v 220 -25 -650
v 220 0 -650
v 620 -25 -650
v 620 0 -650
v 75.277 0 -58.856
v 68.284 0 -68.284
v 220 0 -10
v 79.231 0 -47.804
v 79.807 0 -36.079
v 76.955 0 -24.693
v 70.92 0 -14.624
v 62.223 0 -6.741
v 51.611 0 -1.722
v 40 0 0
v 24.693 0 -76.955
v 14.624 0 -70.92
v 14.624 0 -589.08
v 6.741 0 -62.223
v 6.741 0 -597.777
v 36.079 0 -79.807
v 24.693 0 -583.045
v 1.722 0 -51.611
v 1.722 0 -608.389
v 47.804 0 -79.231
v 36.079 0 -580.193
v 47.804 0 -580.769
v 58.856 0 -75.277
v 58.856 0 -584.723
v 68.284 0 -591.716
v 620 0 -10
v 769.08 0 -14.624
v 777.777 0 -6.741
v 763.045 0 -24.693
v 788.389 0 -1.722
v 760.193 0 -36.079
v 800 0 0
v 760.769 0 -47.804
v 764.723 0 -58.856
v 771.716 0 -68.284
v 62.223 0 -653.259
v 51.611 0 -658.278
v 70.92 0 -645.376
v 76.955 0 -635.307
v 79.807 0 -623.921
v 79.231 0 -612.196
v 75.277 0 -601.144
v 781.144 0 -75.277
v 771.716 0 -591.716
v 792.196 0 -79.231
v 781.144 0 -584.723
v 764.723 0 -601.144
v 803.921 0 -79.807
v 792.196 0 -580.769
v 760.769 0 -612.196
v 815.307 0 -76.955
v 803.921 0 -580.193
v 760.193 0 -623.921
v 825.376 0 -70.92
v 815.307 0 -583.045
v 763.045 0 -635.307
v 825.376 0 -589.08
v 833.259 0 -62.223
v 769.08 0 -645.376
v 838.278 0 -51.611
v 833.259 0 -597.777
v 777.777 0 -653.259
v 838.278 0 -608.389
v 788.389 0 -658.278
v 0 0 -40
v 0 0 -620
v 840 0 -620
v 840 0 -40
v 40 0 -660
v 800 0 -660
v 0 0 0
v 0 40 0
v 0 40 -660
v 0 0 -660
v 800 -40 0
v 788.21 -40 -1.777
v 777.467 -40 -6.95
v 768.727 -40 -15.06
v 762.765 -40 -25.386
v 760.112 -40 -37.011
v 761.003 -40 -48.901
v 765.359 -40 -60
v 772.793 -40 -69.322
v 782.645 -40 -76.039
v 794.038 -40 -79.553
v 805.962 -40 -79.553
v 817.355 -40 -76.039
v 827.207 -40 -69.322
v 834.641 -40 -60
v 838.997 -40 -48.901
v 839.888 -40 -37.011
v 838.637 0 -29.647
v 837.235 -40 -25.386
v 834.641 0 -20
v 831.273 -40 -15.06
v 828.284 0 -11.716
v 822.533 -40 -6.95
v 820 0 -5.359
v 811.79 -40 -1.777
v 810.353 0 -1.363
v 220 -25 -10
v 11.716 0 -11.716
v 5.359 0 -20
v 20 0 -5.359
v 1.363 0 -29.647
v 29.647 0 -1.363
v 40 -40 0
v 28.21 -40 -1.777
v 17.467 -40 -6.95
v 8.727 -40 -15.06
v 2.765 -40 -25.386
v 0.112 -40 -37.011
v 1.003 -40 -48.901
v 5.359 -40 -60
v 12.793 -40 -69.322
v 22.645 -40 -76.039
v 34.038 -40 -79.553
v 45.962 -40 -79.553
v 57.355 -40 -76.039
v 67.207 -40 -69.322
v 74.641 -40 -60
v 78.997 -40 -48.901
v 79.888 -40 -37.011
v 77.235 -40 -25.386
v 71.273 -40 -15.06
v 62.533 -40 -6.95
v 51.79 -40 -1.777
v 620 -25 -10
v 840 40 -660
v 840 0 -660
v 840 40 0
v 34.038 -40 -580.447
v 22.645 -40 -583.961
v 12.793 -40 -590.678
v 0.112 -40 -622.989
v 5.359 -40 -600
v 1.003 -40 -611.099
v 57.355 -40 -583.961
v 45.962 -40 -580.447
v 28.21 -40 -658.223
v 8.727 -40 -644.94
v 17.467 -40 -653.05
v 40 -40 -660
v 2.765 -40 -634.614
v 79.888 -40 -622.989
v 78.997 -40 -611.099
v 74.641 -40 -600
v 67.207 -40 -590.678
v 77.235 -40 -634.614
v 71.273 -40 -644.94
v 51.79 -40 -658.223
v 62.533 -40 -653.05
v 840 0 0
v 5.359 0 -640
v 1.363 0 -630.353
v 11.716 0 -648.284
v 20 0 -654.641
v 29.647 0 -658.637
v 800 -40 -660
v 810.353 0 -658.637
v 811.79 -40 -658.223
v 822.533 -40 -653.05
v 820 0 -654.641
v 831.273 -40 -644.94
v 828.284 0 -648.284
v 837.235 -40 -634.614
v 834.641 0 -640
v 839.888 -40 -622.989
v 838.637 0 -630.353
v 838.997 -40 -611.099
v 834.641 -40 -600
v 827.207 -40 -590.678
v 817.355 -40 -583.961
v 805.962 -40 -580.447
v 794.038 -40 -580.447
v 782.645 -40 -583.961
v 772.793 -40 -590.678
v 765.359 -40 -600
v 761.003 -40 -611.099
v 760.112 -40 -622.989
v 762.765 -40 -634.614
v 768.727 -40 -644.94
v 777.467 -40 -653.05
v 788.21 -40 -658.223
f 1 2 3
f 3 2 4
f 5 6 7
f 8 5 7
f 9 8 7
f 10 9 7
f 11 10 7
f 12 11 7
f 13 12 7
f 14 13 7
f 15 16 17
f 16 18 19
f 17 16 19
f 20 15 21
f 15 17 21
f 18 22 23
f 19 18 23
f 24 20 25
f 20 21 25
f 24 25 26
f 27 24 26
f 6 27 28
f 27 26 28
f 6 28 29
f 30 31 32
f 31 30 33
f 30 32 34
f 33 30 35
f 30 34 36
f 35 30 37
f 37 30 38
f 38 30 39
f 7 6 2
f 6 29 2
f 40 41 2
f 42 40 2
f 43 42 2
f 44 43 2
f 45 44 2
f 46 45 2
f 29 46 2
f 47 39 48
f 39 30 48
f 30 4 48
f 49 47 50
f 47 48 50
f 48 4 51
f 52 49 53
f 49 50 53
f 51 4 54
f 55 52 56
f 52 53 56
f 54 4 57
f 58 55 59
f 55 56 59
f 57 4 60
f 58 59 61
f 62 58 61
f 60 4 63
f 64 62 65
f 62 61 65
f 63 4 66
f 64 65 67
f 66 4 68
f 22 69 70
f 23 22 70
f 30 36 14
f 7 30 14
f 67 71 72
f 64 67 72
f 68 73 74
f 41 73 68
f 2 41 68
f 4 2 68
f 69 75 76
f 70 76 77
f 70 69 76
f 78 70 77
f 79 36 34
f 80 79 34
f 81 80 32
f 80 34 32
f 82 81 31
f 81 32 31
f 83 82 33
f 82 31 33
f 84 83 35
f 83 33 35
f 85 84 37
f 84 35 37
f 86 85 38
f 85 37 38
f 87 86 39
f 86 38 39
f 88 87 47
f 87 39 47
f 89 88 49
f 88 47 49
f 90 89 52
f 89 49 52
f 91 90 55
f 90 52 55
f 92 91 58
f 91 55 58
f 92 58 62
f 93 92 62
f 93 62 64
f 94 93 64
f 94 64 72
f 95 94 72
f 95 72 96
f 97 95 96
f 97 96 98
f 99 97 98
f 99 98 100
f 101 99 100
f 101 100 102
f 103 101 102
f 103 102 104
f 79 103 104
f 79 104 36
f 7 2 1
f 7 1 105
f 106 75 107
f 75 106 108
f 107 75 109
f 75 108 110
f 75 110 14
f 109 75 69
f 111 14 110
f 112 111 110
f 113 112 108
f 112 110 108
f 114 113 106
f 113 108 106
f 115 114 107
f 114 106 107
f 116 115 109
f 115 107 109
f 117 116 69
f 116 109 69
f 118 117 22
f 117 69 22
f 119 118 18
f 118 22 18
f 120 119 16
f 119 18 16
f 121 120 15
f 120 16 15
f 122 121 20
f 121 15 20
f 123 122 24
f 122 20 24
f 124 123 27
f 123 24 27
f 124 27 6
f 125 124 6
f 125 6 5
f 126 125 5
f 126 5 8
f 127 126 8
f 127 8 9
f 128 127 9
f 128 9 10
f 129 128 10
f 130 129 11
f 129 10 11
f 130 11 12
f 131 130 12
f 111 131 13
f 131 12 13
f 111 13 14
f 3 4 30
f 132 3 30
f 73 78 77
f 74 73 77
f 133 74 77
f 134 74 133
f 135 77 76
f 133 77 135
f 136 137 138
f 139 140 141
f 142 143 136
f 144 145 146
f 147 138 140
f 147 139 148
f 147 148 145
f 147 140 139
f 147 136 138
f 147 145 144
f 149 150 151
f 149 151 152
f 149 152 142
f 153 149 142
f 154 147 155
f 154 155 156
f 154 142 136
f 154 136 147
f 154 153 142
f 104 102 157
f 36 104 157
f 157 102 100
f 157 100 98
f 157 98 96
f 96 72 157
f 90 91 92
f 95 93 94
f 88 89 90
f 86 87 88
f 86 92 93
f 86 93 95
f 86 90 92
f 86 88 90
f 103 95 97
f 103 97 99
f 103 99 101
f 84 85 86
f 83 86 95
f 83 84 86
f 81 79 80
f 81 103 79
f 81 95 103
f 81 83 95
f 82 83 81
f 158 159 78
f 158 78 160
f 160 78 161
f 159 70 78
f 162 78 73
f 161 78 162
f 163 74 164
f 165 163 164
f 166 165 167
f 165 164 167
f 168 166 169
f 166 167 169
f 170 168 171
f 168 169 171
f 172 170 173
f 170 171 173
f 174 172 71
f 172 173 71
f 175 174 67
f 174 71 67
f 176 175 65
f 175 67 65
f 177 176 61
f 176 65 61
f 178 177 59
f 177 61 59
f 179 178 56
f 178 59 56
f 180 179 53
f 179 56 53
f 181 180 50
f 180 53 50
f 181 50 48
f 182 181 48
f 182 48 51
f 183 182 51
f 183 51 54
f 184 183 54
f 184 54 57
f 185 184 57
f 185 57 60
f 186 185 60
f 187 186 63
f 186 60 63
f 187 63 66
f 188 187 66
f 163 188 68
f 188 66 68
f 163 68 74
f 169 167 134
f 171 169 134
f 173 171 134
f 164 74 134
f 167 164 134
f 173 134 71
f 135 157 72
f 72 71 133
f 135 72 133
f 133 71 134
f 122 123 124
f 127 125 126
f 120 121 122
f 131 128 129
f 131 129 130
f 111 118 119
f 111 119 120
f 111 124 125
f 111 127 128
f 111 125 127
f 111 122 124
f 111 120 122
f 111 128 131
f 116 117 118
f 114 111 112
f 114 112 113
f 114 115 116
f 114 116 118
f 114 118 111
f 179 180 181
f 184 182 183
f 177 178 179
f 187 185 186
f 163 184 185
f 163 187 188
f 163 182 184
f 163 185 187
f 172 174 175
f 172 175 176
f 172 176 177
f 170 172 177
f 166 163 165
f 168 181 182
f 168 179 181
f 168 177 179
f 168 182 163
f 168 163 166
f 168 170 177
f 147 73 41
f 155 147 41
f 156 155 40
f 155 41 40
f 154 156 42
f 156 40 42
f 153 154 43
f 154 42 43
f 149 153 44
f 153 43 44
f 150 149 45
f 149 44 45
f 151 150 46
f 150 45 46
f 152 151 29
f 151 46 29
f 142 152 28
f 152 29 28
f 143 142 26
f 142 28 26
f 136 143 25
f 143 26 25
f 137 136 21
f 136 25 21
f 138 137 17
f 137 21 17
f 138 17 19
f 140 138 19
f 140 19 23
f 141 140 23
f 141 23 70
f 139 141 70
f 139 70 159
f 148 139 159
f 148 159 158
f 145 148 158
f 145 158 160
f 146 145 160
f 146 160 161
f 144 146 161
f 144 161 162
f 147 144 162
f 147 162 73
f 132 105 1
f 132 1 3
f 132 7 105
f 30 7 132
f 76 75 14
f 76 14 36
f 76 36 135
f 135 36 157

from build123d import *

# Parameters (mm, degrees)
SKETCH1_W           = 840
SKETCH1_H           = 660
BOSS_EXTRUDE1_DEPTH = 40
SKETCH2_R           = 40
BOSS_EXTRUDE2_DEPTH = 40
SKETCH3_W           = 400
SKETCH3_H           = 640
BOSS_EXTRUDE3_DEPTH = 25


with BuildPart() as part:
    # Sketch1 → Boss-Extrude1 (new body)
    with BuildSketch(Plane(origin=(0, 0, 0), x_dir=(1, 0, 0), z_dir=(0, 1, 0))):
        with Locations((420, 330)):
            Rectangle(SKETCH1_W, SKETCH1_H)
    extrude(amount=BOSS_EXTRUDE1_DEPTH)

    # Sketch2 → Boss-Extrude2 (add)
    with BuildSketch(Plane.XZ):
        with Locations(Location((40, -40, 0), (0, 0, 90))):
            Circle(SKETCH2_R)
        with Locations(Location((800, -40, 0), (0, 0, 90))):
            Circle(SKETCH2_R)
        with Locations(Location((40, -620, 0), (0, 0, 270))):
            Circle(SKETCH2_R)
        with Locations(Location((800, -620, 0), (0, 0, 270))):
            Circle(SKETCH2_R)
    extrude(amount=BOSS_EXTRUDE2_DEPTH)

    # Sketch3 → Boss-Extrude3 (add)
    with BuildSketch(Plane.XZ):
        with Locations((420, -330)):
            Rectangle(SKETCH3_W, SKETCH3_H)
    extrude(amount=BOSS_EXTRUDE3_DEPTH)


solid = part.part
